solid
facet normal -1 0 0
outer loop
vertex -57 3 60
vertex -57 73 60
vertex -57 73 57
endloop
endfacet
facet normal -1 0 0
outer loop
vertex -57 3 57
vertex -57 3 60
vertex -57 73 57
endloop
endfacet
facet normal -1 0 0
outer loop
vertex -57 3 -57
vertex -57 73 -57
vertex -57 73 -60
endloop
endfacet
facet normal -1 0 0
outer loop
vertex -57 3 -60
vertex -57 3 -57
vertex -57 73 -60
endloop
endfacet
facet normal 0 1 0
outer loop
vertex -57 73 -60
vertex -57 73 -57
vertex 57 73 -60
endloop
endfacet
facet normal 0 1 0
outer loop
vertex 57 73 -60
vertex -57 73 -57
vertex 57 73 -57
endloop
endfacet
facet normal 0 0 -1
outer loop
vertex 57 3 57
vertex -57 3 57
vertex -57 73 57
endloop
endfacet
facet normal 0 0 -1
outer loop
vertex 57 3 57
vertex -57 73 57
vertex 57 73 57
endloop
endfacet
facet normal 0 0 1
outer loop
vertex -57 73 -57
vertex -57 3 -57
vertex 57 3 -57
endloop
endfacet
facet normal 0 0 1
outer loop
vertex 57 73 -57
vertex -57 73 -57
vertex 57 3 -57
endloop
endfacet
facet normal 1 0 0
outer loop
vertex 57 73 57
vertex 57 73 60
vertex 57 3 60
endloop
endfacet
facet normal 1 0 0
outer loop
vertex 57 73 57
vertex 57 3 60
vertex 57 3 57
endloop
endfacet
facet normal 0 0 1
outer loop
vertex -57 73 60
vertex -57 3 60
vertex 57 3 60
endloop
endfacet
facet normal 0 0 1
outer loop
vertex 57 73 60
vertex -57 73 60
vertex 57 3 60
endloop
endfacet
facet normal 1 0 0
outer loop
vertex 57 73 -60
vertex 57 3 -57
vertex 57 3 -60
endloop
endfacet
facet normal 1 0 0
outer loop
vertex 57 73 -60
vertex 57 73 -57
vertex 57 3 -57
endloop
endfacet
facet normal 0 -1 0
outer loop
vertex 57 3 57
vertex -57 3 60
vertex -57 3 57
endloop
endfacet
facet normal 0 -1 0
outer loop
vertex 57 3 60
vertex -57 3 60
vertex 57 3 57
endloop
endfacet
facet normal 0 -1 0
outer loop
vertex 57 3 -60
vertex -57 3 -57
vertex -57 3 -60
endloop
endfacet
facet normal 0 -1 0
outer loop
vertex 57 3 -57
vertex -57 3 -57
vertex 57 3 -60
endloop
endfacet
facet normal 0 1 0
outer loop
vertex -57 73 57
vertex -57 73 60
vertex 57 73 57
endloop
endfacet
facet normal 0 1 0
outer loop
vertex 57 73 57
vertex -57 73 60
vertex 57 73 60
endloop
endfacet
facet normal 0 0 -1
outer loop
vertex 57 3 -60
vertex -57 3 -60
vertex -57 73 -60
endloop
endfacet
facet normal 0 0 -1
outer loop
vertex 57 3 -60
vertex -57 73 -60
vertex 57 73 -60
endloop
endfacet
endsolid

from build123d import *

# Parameters (mm, degrees)
SKETCH1_W           = 140
SKETCH1_H           = 160
BOSS_EXTRUDE1_DEPTH = 3
SKETCH2_W           = 120
SKETCH2_H           = 120
SKETCH2_W_2         = 114
SKETCH2_H_2         = 114
BOSS_EXTRUDE2_DEPTH = 70
SKETCH4_W           = 120
SKETCH4_H           = 120
BOSS_EXTRUDE4_DEPTH = 3
SKETCH5_R           = 2.1
SKETCH5_W           = 39.9
SKETCH5_H           = 19.71
CUT_EXTRUDE2_DEPTH  = 3
SKETCH6_W           = 18.298163042
SKETCH6_H           = 17.309993256
CUT_EXTRUDE3_DEPTH  = 3
CUT_EXTRUDE8_DEPTH  = 5
SKETCH15_W          = 259.021634325
SKETCH15_H          = 180.269434884
BOSS_EXTRUDE5_DEPTH = 3
SKETCH18_R          = 1.6
CUT_EXTRUDE9_DEPTH  = 10
SKETCH19_W          = 12
SKETCH19_H          = 4.5
SKETCH19_H_2        = 8.4
SKETCH19_W_2        = 10.084057066
SKETCH19_H_3        = 7.362028533
CUT_EXTRUDE11_DEPTH = 5
SKETCH20_W          = 263.921538054
SKETCH20_H          = 19.630552878
SKETCH20_W_2        = 120
SKETCH20_H_2        = 3
CUT_EXTRUDE12_DEPTH = 233.259150239
SKETCH21_W          = 259.021634325
SKETCH21_H          = 40.269434884
CUT_EXTRUDE13_DEPTH = 209.619923406
SKETCH22_W          = 3
SKETCH22_H          = 120
SKETCH22_H_2        = 122.072039114
CUT_EXTRUDE14_DEPTH = 111


with BuildPart() as part:
    # Sketch1 → Boss-Extrude1 (new body)
    with BuildSketch(Plane(origin=(0, 0, 0), x_dir=(1, 0, 0), z_dir=(0, 1, 0))):
        Rectangle(SKETCH1_W, SKETCH1_H)
    extrude(amount=BOSS_EXTRUDE1_DEPTH)

    # Sketch2 → Boss-Extrude2 (add)
    with BuildSketch(Plane(origin=(0, 3, 0), x_dir=(1, 0, 0), z_dir=(0, 1, 0))):
        Rectangle(SKETCH2_W, SKETCH2_H)
        Rectangle(SKETCH2_W_2, SKETCH2_H_2, mode=Mode.SUBTRACT)
    extrude(amount=BOSS_EXTRUDE2_DEPTH)

    # Sketch4 → Boss-Extrude4 (add)
    with BuildSketch(Plane(origin=(0, 73, 0), x_dir=(1, 0, 0), z_dir=(0, 1, 0))):
        Rectangle(SKETCH4_W, SKETCH4_H)
    extrude(amount=BOSS_EXTRUDE4_DEPTH)

    # Sketch5 → Cut-Extrude2 (cut)
    with BuildSketch(Plane(origin=(0, 76, 0), x_dir=(1, 0, 0), z_dir=(0, 1, 0))):
        with Locations(Location((34.39, -4.925, 0), (0, 0, 270))):
            Circle(SKETCH5_R)
        with Locations(Location((34.39, 4.925, 0), (0, 0, 270))):
            Circle(SKETCH5_R)
        with Locations(Location((-15.03, -4.925, 0), (0, 0, 270))):
            Circle(SKETCH5_R)
        with Locations(Location((-15.03, 4.925, 0), (0, 0, 270))):
            Circle(SKETCH5_R)
        with Locations((9.68, 0)):
            Rectangle(SKETCH5_W, SKETCH5_H)
    extrude(amount=-CUT_EXTRUDE2_DEPTH, mode=Mode.SUBTRACT)

    # Sketch6 → Cut-Extrude3 (cut)
    with BuildSketch(Plane(origin=(0, 76, 0), x_dir=(1, 0, 0), z_dir=(0, 1, 0))):
        Rectangle(SKETCH6_W, SKETCH6_H)
    extrude(amount=-CUT_EXTRUDE3_DEPTH, mode=Mode.SUBTRACT)

    # Sketch13 → Cut-Extrude8 (cut)
    with BuildSketch(Plane(origin=(0, 76, 0), x_dir=(1, 0, 0), z_dir=(0, 1, 0))):
        with BuildLine():
            ThreePointArc((-3.792582359, 49.728765052), (-53.491503795, -1.722579942), (-0.349490011, -49.609426409))
            ThreePointArc((-0.349490011, -49.609426409), (5.82592347, -42.51288634), (-1.270616599, -36.337472859))
            ThreePointArc((-1.270616599, -36.337472859), (-40.195607742, -1.261740085), (-3.792582359, 36.42488497))
            ThreePointArc((-3.792582359, 36.42488497), (2.859357682, 43.076825011), (-3.792582359, 49.728765052))
        make_face()
    extrude(amount=-CUT_EXTRUDE8_DEPTH, mode=Mode.SUBTRACT)

    # Sketch15 → Boss-Extrude5 (add)
    with BuildSketch(Plane(origin=(0, 3, 0), x_dir=(1, 0, 0), z_dir=(0, 1, 0))):
        with Locations((-39.510817163, -10.134717442)):
            Rectangle(SKETCH15_W, SKETCH15_H)
    extrude(amount=-BOSS_EXTRUDE5_DEPTH)

    # Sketch18 → Cut-Extrude9 (cut)
    with BuildSketch(Plane(origin=(0, 3, 0), x_dir=(1, 0, 0), z_dir=(0, 1, 0))):
        with Locations(Location((-55.452, -27.227420358, 0), (0, 0, 194.647469308))):
            Circle(SKETCH18_R)
        with Locations(Location((-55.452, 32.208579642, 0), (0, 0, 194.647469308))):
            Circle(SKETCH18_R)
        with Locations(Location((4.746, 32.208579642, 0), (0, 0, 270))):
            Circle(SKETCH18_R)
        with Locations(Location((4.746, -27.227420358, 0), (0, 0, 270))):
            Circle(SKETCH18_R)
    extrude(amount=-CUT_EXTRUDE9_DEPTH, mode=Mode.SUBTRACT)

    # Sketch19 → Cut-Extrude11 (cut)
    with BuildSketch(Plane.ZY.offset(60)):
        with Locations((12.367420358, 33)):
            Rectangle(SKETCH19_W, SKETCH19_H)
        with Locations((-11.259414931, 37.2)):
            Rectangle(SKETCH19_W, SKETCH19_H_2)
        with Locations((-28.606781654, 36.742945388)):
            Rectangle(SKETCH19_W_2, SKETCH19_H_3)
    extrude(amount=-CUT_EXTRUDE11_DEPTH, mode=Mode.SUBTRACT)

    # Sketch20 → Cut-Extrude12 (cut, through all)
    with BuildSketch(Plane.XY.offset(60)):
        with Locations((-37.060865298, -6.815276439)):
            Rectangle(SKETCH20_W, SKETCH20_H)
        with Locations((0, 74.5)):
            Rectangle(SKETCH20_W_2, SKETCH20_H_2)
    extrude(amount=-CUT_EXTRUDE12_DEPTH, mode=Mode.SUBTRACT)


with BuildPart() as cut_extrude12_piece_1:
    # of the separate pieces the step leaves, piece 1, a body of its own (cut_extrude12_pieces)
    add(part.part.solids().sort_by_distance((60, 73, 60))[0])

    # Sketch22 → Cut-Extrude14 (cut, through all)
    with BuildSketch(Plane(origin=(0, 73, 0), x_dir=(1, 0, 0), z_dir=(0, 1, 0))):
        with Locations((-58.5, 0)):
            Rectangle(SKETCH22_W, SKETCH22_H)
        with Locations((58.5, -1.036019557)):
            Rectangle(SKETCH22_W, SKETCH22_H_2)
    extrude(amount=-CUT_EXTRUDE14_DEPTH, mode=Mode.SUBTRACT)


with BuildPart() as cut_extrude12_piece_2:
    # of the separate pieces the step leaves, piece 2, a body of its own (cut_extrude12_pieces)
    add(part.part.solids().sort_by_distance((90, 0, 60))[0])

    # Sketch21 → Cut-Extrude13 (cut, through all)
    with BuildSketch(Plane(origin=(0, 3, 0), x_dir=(1, 0, 0), z_dir=(0, 1, 0))):
        with Locations((-39.510817163, -80.134717442)):
            Rectangle(SKETCH21_W, SKETCH21_H)
    extrude(amount=-CUT_EXTRUDE13_DEPTH, mode=Mode.SUBTRACT)


with BuildPart() as cut_extrude14_piece_1:
    # of the separate pieces the step leaves, piece 1, a body of its own (cut_extrude14_pieces)
    add(cut_extrude12_piece_1.part.solids().sort_by_distance((57, 3, -57))[0])


with BuildPart() as cut_extrude14_piece_2:
    # of the separate pieces the step leaves, piece 2, a body of its own (cut_extrude14_pieces)
    add(cut_extrude12_piece_1.part.solids().sort_by_distance((57, 73, 60))[0])


solid = Compound([cut_extrude14_piece_1.part, cut_extrude14_piece_2.part])
